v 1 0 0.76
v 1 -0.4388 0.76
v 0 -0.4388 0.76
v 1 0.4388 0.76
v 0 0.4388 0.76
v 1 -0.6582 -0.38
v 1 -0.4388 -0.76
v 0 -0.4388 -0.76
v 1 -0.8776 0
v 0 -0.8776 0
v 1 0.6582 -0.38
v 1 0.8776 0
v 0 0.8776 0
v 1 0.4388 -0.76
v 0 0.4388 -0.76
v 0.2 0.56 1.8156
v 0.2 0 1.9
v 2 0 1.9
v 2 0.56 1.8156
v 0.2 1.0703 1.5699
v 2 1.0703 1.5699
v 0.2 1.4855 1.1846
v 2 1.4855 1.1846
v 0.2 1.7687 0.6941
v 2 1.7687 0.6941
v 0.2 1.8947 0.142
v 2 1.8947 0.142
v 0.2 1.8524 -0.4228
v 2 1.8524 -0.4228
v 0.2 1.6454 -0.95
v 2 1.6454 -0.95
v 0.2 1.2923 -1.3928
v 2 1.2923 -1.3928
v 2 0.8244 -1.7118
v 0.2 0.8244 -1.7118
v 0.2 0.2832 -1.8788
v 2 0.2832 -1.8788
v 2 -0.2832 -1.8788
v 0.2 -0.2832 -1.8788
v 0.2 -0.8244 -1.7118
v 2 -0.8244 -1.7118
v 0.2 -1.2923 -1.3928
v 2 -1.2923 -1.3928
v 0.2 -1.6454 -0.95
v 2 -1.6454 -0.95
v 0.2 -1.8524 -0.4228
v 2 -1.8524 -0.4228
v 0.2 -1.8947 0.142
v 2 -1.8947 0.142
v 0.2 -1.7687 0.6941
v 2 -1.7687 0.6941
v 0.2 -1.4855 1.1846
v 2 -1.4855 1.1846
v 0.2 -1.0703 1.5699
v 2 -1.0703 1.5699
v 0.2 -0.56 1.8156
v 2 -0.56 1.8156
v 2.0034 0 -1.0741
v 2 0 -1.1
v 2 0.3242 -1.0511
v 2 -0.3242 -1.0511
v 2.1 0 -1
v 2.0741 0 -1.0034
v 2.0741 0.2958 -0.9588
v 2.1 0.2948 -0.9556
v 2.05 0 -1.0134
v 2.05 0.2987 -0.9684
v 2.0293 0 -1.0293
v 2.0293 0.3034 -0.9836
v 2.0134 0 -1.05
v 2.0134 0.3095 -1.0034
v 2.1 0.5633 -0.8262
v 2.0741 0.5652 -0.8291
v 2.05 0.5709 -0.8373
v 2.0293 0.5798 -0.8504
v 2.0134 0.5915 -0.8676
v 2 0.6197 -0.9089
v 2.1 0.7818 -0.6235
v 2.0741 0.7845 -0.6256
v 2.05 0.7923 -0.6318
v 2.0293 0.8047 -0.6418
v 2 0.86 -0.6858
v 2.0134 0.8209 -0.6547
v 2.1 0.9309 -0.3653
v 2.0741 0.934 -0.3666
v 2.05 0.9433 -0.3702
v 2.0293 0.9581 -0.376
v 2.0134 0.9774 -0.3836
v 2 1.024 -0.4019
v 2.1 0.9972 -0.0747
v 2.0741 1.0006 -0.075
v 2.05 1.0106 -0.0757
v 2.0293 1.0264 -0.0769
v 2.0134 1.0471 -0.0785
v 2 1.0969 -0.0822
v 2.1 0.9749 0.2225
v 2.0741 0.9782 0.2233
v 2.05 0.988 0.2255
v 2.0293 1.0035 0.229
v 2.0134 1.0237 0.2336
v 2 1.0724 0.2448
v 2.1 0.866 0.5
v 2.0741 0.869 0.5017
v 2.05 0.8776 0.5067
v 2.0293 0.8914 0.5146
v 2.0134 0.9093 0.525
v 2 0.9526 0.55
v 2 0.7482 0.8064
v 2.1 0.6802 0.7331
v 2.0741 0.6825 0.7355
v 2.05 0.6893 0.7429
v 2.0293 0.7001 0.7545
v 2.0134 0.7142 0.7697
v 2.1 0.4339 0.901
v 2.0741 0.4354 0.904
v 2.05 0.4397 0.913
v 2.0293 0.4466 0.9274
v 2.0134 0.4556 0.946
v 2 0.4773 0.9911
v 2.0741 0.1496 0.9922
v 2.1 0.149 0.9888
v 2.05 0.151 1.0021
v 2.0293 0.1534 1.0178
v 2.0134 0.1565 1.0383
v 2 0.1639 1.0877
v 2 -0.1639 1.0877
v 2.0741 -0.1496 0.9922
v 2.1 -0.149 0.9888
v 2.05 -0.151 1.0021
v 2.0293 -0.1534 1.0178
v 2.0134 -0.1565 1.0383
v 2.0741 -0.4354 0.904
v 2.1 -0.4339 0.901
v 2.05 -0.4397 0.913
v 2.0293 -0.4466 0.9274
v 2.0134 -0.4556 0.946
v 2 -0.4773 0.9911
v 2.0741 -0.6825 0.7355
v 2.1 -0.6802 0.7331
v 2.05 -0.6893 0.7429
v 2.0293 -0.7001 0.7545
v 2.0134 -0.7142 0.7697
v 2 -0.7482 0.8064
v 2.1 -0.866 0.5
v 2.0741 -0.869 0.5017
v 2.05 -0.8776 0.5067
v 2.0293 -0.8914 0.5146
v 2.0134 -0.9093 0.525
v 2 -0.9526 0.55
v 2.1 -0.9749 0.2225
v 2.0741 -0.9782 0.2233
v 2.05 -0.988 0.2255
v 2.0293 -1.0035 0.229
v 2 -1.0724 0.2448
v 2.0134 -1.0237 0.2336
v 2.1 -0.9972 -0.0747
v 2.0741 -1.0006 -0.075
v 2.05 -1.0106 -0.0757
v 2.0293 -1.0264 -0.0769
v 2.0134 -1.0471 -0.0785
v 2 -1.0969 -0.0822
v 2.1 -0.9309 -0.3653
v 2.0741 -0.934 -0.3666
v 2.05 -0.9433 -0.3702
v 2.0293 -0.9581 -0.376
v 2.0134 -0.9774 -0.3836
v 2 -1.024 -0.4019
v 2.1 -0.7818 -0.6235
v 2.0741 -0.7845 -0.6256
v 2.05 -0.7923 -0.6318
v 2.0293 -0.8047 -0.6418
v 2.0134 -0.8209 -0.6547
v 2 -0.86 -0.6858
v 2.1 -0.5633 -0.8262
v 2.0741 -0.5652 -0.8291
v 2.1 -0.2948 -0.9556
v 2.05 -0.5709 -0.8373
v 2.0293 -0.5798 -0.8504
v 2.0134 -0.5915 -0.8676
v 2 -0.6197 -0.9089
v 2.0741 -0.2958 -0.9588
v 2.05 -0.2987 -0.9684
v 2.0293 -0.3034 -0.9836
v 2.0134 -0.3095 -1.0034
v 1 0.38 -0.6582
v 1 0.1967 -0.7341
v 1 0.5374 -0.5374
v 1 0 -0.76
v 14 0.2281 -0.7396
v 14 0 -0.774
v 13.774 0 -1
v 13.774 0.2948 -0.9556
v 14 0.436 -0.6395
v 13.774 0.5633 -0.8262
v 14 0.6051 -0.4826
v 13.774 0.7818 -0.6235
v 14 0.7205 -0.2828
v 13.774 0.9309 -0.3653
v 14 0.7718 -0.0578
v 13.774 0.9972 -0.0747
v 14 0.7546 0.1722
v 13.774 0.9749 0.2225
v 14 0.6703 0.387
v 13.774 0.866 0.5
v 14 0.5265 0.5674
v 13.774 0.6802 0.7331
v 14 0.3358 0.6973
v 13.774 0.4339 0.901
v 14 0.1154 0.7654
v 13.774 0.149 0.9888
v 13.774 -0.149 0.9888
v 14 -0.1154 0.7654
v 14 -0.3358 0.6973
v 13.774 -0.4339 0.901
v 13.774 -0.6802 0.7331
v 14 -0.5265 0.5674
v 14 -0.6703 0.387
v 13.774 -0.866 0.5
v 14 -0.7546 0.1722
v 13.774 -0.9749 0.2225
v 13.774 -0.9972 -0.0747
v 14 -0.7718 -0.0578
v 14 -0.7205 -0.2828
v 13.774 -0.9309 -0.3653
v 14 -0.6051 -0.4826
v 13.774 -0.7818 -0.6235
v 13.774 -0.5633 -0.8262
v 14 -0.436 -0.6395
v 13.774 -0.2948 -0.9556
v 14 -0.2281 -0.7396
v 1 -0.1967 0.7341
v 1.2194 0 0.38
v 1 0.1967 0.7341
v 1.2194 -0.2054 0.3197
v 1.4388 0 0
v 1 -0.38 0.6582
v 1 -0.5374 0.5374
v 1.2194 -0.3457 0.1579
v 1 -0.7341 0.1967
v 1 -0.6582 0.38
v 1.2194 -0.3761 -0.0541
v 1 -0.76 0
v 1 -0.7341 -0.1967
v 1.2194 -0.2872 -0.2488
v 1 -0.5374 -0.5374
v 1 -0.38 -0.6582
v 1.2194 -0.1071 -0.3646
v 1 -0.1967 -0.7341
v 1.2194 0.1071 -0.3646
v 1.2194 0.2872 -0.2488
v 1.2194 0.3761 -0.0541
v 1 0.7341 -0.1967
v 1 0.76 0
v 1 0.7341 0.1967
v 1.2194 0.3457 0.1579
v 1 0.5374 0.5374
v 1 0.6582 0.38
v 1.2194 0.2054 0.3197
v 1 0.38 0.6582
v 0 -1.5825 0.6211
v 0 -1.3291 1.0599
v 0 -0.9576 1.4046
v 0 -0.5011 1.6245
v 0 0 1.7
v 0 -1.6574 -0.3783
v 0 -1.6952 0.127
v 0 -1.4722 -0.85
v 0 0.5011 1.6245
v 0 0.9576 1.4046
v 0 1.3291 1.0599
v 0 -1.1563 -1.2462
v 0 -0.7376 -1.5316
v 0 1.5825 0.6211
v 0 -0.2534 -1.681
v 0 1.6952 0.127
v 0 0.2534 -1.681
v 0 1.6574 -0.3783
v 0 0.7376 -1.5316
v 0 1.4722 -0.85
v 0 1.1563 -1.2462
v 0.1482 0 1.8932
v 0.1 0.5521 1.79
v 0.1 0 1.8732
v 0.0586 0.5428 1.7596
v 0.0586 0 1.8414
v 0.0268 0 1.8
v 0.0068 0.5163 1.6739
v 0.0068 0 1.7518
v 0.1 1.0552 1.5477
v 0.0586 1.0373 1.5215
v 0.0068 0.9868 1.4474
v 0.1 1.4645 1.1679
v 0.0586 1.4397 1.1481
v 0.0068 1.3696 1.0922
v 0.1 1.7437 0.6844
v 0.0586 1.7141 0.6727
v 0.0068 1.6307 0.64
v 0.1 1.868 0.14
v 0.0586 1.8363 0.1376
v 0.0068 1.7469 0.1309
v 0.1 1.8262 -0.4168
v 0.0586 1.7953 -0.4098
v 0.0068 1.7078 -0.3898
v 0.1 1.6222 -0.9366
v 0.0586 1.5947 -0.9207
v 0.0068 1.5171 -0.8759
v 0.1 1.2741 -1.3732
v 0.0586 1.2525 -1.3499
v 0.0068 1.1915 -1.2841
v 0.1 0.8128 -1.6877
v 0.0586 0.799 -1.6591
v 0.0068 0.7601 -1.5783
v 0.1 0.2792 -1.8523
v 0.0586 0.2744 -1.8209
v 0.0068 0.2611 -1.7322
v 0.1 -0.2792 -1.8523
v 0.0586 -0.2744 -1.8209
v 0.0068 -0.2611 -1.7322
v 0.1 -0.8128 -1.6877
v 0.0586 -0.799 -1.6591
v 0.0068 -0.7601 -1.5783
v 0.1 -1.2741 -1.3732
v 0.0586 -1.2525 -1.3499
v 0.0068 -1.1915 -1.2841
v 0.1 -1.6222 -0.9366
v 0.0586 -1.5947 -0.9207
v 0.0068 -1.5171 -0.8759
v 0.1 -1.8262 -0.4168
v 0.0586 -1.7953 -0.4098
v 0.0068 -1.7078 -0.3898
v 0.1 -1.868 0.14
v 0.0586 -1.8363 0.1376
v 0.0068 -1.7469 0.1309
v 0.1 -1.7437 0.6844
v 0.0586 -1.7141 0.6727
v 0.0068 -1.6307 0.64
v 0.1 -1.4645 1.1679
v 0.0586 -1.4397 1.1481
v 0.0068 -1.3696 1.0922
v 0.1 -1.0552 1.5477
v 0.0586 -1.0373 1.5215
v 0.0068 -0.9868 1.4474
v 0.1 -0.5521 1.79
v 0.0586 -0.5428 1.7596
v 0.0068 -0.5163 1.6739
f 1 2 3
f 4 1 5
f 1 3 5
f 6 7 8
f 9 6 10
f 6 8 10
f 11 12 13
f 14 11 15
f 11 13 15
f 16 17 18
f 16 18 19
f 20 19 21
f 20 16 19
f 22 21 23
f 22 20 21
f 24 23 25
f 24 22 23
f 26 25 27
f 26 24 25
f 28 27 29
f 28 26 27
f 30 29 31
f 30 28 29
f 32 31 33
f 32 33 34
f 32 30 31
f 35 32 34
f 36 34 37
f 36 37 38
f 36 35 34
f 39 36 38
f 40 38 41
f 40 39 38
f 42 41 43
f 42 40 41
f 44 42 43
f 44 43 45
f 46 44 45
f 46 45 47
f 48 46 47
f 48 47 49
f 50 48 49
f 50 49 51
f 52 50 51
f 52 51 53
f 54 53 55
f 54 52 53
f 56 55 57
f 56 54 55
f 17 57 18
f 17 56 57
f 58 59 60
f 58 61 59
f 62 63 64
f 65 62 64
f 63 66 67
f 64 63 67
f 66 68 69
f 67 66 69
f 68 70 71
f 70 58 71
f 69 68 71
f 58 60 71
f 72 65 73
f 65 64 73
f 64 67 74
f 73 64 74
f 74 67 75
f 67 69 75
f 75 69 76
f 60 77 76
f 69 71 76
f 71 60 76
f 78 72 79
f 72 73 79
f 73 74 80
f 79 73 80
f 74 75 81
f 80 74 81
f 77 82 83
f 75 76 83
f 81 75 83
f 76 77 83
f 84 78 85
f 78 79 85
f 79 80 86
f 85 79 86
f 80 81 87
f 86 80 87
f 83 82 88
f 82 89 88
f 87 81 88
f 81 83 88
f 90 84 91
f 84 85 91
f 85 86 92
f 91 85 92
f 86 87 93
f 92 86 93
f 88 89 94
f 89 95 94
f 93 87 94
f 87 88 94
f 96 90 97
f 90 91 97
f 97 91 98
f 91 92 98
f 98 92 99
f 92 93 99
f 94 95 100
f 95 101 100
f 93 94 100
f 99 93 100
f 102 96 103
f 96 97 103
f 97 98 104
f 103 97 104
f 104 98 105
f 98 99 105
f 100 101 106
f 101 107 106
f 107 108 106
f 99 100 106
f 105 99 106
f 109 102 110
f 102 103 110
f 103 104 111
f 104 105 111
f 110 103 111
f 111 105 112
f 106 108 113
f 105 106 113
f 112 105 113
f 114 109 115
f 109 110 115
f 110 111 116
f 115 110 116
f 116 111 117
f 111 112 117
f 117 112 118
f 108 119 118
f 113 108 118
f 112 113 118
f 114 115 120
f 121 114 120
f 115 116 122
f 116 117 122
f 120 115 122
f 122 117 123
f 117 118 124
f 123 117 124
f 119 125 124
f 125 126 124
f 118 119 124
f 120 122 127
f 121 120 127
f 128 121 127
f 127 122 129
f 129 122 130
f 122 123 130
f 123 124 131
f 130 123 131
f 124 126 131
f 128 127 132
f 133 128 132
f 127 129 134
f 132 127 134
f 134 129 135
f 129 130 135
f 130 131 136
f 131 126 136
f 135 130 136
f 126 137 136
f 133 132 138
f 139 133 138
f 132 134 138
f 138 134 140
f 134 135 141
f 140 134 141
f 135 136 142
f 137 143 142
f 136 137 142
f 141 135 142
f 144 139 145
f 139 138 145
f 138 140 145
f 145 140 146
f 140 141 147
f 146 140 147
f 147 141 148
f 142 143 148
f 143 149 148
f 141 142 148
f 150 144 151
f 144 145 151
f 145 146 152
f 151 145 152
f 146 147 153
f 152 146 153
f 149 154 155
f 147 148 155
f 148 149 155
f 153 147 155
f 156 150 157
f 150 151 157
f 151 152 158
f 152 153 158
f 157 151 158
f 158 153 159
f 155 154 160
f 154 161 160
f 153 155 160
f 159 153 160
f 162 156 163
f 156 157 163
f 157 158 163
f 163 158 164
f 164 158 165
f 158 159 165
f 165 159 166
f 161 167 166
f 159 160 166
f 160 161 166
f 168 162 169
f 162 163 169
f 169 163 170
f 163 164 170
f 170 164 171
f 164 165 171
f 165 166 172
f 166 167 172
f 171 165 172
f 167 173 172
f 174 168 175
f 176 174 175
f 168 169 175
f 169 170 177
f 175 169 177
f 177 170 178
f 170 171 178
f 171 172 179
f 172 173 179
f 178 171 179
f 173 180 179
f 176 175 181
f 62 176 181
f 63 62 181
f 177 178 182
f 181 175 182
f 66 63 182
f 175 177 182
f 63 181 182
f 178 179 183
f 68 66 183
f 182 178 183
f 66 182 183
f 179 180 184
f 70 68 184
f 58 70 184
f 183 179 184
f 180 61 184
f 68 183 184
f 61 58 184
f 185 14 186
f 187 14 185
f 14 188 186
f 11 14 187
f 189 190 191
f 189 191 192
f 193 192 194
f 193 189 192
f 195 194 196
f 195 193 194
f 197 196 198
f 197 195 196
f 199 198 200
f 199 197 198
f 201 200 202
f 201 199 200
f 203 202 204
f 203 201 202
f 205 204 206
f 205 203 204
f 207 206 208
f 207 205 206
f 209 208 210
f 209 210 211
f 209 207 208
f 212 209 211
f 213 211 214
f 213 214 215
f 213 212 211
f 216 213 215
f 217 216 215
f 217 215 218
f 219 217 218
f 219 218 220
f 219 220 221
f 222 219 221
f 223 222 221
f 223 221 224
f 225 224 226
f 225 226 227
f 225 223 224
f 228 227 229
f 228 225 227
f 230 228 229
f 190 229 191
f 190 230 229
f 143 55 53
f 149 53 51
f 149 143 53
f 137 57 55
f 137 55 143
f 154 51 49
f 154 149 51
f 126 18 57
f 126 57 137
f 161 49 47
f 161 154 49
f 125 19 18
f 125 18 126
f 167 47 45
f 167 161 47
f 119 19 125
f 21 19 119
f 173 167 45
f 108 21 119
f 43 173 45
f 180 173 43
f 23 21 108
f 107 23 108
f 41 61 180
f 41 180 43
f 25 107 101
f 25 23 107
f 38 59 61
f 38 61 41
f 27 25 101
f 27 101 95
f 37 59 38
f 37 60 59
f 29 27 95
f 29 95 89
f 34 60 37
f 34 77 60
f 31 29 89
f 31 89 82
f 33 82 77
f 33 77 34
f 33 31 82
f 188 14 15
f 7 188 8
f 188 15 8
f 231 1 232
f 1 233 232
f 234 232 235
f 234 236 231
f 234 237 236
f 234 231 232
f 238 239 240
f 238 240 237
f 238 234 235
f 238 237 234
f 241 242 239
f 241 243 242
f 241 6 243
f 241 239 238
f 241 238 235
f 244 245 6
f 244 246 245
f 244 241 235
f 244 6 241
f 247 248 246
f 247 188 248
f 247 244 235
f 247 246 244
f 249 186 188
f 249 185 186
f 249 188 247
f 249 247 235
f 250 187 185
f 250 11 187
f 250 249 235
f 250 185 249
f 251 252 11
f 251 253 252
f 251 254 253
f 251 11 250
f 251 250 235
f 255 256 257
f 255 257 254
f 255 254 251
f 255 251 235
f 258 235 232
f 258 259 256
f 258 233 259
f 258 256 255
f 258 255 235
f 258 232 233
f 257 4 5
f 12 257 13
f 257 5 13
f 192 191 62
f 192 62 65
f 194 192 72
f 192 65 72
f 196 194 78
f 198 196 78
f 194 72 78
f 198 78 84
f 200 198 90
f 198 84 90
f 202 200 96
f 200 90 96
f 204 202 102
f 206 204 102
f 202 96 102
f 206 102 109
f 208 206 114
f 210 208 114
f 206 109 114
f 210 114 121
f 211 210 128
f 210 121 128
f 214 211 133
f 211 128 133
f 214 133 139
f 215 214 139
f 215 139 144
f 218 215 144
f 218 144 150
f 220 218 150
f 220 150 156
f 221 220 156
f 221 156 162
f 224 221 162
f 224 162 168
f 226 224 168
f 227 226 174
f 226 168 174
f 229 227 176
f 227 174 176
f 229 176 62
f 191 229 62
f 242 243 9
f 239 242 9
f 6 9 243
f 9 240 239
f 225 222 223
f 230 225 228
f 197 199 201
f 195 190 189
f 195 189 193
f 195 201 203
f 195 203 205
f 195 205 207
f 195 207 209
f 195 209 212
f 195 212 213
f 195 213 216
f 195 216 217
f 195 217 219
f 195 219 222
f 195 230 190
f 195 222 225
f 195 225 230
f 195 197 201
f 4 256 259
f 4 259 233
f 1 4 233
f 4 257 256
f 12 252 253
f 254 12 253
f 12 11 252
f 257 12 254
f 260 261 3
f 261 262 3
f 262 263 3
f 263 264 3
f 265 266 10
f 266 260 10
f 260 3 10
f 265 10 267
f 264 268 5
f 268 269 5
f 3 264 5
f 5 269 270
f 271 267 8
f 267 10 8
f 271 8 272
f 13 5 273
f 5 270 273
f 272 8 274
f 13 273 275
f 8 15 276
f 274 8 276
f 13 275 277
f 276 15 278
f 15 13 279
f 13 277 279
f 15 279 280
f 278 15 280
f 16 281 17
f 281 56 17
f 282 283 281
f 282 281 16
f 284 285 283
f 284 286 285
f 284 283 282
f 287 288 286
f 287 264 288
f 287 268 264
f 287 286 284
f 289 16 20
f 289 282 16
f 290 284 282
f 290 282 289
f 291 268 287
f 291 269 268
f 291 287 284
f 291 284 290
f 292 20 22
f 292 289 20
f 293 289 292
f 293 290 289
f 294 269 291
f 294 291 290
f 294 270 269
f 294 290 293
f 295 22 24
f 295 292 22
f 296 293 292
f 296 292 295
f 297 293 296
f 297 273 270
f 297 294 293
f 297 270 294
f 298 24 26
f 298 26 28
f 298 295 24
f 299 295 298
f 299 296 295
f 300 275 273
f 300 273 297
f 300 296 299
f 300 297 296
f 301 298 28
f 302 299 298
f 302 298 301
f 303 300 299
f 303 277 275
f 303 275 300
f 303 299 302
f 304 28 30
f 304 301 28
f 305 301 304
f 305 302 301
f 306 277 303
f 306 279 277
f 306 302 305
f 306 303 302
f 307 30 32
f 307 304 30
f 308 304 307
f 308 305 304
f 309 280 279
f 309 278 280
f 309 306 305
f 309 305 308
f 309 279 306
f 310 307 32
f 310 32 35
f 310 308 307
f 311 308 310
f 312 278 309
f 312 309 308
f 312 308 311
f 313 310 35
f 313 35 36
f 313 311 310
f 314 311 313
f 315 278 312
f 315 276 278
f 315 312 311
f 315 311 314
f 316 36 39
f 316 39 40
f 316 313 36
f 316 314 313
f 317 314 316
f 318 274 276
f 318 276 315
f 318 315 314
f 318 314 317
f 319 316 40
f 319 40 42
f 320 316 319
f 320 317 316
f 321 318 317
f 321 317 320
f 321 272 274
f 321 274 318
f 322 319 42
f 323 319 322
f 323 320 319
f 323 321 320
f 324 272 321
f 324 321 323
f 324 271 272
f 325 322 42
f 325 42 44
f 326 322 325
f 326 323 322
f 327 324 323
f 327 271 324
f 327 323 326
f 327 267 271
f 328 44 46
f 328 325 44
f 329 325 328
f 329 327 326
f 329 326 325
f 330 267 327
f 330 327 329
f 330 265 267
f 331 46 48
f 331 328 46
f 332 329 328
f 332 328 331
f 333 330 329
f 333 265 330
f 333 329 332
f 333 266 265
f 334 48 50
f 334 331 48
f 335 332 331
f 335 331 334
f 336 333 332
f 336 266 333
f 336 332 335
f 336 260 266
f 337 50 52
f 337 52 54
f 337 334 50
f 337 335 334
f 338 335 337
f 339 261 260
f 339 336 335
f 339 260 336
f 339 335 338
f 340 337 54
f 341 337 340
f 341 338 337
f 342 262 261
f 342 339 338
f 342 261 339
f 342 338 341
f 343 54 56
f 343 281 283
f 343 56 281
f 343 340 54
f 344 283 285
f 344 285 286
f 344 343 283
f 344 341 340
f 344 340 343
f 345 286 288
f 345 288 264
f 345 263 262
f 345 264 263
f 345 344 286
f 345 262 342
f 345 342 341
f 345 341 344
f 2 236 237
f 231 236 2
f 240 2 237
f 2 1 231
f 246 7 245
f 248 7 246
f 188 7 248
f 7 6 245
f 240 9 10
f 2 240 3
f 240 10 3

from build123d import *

# Parameters (mm, degrees)
SKETCH_1_W          = 2
SKETCH_1_H          = 1.9
SKETCH_2_R          = 1
EXTRUDE_1_DEPTH     = 12
CUT_EXTRUDE_1_DEPTH = 1
CHAMFER_1_SIZE      = 0.226
FILLET_1_R          = 0.1
FILLET_2_R          = 0.2


with BuildPart() as part:
    # Эскиз1 → Повернуть1 (revolve)
    with BuildSketch(Plane(origin=(0, 0, 0), x_dir=(-1, 0, 0), z_dir=(0, 0, -1)), mode=Mode.PRIVATE) as revolve_1_sk:
        with Locations((-1, 0.95)):
            Rectangle(SKETCH_1_W, SKETCH_1_H)
    revolve(revolve_1_sk.sketch.rotate(Axis((2, 0, 0), (-1, 0, 0)), 270), axis=Axis((2, 0, 0), (-1, 0, 0)))

    # Эскиз2 → Бобышка-Вытянуть1 (add)
    with BuildSketch(Plane(origin=(2, 0, 0), x_dir=(0, 0, -1), z_dir=(1, 0, 0))):
        Circle(SKETCH_2_R)
    extrude(amount=EXTRUDE_1_DEPTH)

    # Эскиз3 → Вырез-Вытянуть1 (cut)
    with BuildSketch(Plane.ZY):
        Polygon((-0.76, -0.438786205), (0, -0.877572409), (0.76, -0.438786205), (0.76, 0.438786205), (0, 0.877572409), (-0.76, 0.438786205), align=None)
    extrude(amount=-CUT_EXTRUDE_1_DEPTH, mode=Mode.SUBTRACT)

    # Эскиз4 → Вырез-Повернуть1 (revolve, cut)
    with BuildSketch(Plane.XY, mode=Mode.PRIVATE) as cut_revolve_1_sk:
        Polygon((1, 0.76), (1, 0), (1.438786205, 0), align=None)
    revolve(cut_revolve_1_sk.sketch.rotate(Axis((0.999975, 0, 0), (1, 0, 0)), 90), axis=Axis((0.999975, 0, 0), (1, 0, 0)), mode=Mode.SUBTRACT)

    # Фаска1
    chamfer_1_edges = [part.edges().sort_by_distance(p)[0] for p in [
        (14, 0, 1),
    ]]
    chamfer(chamfer_1_edges, length=CHAMFER_1_SIZE)

    # Скругление1
    fillet_1_edges = [part.edges().sort_by_distance(p)[0] for p in [
        (2, 0, 1),
    ]]
    fillet(fillet_1_edges, radius=FILLET_1_R)

    # Скругление2
    fillet_2_edges = [part.edges().sort_by_distance(p)[0] for p in [
        (0, 0, -1.9),
    ]]
    fillet(fillet_2_edges, radius=FILLET_2_R)


solid = part.part
